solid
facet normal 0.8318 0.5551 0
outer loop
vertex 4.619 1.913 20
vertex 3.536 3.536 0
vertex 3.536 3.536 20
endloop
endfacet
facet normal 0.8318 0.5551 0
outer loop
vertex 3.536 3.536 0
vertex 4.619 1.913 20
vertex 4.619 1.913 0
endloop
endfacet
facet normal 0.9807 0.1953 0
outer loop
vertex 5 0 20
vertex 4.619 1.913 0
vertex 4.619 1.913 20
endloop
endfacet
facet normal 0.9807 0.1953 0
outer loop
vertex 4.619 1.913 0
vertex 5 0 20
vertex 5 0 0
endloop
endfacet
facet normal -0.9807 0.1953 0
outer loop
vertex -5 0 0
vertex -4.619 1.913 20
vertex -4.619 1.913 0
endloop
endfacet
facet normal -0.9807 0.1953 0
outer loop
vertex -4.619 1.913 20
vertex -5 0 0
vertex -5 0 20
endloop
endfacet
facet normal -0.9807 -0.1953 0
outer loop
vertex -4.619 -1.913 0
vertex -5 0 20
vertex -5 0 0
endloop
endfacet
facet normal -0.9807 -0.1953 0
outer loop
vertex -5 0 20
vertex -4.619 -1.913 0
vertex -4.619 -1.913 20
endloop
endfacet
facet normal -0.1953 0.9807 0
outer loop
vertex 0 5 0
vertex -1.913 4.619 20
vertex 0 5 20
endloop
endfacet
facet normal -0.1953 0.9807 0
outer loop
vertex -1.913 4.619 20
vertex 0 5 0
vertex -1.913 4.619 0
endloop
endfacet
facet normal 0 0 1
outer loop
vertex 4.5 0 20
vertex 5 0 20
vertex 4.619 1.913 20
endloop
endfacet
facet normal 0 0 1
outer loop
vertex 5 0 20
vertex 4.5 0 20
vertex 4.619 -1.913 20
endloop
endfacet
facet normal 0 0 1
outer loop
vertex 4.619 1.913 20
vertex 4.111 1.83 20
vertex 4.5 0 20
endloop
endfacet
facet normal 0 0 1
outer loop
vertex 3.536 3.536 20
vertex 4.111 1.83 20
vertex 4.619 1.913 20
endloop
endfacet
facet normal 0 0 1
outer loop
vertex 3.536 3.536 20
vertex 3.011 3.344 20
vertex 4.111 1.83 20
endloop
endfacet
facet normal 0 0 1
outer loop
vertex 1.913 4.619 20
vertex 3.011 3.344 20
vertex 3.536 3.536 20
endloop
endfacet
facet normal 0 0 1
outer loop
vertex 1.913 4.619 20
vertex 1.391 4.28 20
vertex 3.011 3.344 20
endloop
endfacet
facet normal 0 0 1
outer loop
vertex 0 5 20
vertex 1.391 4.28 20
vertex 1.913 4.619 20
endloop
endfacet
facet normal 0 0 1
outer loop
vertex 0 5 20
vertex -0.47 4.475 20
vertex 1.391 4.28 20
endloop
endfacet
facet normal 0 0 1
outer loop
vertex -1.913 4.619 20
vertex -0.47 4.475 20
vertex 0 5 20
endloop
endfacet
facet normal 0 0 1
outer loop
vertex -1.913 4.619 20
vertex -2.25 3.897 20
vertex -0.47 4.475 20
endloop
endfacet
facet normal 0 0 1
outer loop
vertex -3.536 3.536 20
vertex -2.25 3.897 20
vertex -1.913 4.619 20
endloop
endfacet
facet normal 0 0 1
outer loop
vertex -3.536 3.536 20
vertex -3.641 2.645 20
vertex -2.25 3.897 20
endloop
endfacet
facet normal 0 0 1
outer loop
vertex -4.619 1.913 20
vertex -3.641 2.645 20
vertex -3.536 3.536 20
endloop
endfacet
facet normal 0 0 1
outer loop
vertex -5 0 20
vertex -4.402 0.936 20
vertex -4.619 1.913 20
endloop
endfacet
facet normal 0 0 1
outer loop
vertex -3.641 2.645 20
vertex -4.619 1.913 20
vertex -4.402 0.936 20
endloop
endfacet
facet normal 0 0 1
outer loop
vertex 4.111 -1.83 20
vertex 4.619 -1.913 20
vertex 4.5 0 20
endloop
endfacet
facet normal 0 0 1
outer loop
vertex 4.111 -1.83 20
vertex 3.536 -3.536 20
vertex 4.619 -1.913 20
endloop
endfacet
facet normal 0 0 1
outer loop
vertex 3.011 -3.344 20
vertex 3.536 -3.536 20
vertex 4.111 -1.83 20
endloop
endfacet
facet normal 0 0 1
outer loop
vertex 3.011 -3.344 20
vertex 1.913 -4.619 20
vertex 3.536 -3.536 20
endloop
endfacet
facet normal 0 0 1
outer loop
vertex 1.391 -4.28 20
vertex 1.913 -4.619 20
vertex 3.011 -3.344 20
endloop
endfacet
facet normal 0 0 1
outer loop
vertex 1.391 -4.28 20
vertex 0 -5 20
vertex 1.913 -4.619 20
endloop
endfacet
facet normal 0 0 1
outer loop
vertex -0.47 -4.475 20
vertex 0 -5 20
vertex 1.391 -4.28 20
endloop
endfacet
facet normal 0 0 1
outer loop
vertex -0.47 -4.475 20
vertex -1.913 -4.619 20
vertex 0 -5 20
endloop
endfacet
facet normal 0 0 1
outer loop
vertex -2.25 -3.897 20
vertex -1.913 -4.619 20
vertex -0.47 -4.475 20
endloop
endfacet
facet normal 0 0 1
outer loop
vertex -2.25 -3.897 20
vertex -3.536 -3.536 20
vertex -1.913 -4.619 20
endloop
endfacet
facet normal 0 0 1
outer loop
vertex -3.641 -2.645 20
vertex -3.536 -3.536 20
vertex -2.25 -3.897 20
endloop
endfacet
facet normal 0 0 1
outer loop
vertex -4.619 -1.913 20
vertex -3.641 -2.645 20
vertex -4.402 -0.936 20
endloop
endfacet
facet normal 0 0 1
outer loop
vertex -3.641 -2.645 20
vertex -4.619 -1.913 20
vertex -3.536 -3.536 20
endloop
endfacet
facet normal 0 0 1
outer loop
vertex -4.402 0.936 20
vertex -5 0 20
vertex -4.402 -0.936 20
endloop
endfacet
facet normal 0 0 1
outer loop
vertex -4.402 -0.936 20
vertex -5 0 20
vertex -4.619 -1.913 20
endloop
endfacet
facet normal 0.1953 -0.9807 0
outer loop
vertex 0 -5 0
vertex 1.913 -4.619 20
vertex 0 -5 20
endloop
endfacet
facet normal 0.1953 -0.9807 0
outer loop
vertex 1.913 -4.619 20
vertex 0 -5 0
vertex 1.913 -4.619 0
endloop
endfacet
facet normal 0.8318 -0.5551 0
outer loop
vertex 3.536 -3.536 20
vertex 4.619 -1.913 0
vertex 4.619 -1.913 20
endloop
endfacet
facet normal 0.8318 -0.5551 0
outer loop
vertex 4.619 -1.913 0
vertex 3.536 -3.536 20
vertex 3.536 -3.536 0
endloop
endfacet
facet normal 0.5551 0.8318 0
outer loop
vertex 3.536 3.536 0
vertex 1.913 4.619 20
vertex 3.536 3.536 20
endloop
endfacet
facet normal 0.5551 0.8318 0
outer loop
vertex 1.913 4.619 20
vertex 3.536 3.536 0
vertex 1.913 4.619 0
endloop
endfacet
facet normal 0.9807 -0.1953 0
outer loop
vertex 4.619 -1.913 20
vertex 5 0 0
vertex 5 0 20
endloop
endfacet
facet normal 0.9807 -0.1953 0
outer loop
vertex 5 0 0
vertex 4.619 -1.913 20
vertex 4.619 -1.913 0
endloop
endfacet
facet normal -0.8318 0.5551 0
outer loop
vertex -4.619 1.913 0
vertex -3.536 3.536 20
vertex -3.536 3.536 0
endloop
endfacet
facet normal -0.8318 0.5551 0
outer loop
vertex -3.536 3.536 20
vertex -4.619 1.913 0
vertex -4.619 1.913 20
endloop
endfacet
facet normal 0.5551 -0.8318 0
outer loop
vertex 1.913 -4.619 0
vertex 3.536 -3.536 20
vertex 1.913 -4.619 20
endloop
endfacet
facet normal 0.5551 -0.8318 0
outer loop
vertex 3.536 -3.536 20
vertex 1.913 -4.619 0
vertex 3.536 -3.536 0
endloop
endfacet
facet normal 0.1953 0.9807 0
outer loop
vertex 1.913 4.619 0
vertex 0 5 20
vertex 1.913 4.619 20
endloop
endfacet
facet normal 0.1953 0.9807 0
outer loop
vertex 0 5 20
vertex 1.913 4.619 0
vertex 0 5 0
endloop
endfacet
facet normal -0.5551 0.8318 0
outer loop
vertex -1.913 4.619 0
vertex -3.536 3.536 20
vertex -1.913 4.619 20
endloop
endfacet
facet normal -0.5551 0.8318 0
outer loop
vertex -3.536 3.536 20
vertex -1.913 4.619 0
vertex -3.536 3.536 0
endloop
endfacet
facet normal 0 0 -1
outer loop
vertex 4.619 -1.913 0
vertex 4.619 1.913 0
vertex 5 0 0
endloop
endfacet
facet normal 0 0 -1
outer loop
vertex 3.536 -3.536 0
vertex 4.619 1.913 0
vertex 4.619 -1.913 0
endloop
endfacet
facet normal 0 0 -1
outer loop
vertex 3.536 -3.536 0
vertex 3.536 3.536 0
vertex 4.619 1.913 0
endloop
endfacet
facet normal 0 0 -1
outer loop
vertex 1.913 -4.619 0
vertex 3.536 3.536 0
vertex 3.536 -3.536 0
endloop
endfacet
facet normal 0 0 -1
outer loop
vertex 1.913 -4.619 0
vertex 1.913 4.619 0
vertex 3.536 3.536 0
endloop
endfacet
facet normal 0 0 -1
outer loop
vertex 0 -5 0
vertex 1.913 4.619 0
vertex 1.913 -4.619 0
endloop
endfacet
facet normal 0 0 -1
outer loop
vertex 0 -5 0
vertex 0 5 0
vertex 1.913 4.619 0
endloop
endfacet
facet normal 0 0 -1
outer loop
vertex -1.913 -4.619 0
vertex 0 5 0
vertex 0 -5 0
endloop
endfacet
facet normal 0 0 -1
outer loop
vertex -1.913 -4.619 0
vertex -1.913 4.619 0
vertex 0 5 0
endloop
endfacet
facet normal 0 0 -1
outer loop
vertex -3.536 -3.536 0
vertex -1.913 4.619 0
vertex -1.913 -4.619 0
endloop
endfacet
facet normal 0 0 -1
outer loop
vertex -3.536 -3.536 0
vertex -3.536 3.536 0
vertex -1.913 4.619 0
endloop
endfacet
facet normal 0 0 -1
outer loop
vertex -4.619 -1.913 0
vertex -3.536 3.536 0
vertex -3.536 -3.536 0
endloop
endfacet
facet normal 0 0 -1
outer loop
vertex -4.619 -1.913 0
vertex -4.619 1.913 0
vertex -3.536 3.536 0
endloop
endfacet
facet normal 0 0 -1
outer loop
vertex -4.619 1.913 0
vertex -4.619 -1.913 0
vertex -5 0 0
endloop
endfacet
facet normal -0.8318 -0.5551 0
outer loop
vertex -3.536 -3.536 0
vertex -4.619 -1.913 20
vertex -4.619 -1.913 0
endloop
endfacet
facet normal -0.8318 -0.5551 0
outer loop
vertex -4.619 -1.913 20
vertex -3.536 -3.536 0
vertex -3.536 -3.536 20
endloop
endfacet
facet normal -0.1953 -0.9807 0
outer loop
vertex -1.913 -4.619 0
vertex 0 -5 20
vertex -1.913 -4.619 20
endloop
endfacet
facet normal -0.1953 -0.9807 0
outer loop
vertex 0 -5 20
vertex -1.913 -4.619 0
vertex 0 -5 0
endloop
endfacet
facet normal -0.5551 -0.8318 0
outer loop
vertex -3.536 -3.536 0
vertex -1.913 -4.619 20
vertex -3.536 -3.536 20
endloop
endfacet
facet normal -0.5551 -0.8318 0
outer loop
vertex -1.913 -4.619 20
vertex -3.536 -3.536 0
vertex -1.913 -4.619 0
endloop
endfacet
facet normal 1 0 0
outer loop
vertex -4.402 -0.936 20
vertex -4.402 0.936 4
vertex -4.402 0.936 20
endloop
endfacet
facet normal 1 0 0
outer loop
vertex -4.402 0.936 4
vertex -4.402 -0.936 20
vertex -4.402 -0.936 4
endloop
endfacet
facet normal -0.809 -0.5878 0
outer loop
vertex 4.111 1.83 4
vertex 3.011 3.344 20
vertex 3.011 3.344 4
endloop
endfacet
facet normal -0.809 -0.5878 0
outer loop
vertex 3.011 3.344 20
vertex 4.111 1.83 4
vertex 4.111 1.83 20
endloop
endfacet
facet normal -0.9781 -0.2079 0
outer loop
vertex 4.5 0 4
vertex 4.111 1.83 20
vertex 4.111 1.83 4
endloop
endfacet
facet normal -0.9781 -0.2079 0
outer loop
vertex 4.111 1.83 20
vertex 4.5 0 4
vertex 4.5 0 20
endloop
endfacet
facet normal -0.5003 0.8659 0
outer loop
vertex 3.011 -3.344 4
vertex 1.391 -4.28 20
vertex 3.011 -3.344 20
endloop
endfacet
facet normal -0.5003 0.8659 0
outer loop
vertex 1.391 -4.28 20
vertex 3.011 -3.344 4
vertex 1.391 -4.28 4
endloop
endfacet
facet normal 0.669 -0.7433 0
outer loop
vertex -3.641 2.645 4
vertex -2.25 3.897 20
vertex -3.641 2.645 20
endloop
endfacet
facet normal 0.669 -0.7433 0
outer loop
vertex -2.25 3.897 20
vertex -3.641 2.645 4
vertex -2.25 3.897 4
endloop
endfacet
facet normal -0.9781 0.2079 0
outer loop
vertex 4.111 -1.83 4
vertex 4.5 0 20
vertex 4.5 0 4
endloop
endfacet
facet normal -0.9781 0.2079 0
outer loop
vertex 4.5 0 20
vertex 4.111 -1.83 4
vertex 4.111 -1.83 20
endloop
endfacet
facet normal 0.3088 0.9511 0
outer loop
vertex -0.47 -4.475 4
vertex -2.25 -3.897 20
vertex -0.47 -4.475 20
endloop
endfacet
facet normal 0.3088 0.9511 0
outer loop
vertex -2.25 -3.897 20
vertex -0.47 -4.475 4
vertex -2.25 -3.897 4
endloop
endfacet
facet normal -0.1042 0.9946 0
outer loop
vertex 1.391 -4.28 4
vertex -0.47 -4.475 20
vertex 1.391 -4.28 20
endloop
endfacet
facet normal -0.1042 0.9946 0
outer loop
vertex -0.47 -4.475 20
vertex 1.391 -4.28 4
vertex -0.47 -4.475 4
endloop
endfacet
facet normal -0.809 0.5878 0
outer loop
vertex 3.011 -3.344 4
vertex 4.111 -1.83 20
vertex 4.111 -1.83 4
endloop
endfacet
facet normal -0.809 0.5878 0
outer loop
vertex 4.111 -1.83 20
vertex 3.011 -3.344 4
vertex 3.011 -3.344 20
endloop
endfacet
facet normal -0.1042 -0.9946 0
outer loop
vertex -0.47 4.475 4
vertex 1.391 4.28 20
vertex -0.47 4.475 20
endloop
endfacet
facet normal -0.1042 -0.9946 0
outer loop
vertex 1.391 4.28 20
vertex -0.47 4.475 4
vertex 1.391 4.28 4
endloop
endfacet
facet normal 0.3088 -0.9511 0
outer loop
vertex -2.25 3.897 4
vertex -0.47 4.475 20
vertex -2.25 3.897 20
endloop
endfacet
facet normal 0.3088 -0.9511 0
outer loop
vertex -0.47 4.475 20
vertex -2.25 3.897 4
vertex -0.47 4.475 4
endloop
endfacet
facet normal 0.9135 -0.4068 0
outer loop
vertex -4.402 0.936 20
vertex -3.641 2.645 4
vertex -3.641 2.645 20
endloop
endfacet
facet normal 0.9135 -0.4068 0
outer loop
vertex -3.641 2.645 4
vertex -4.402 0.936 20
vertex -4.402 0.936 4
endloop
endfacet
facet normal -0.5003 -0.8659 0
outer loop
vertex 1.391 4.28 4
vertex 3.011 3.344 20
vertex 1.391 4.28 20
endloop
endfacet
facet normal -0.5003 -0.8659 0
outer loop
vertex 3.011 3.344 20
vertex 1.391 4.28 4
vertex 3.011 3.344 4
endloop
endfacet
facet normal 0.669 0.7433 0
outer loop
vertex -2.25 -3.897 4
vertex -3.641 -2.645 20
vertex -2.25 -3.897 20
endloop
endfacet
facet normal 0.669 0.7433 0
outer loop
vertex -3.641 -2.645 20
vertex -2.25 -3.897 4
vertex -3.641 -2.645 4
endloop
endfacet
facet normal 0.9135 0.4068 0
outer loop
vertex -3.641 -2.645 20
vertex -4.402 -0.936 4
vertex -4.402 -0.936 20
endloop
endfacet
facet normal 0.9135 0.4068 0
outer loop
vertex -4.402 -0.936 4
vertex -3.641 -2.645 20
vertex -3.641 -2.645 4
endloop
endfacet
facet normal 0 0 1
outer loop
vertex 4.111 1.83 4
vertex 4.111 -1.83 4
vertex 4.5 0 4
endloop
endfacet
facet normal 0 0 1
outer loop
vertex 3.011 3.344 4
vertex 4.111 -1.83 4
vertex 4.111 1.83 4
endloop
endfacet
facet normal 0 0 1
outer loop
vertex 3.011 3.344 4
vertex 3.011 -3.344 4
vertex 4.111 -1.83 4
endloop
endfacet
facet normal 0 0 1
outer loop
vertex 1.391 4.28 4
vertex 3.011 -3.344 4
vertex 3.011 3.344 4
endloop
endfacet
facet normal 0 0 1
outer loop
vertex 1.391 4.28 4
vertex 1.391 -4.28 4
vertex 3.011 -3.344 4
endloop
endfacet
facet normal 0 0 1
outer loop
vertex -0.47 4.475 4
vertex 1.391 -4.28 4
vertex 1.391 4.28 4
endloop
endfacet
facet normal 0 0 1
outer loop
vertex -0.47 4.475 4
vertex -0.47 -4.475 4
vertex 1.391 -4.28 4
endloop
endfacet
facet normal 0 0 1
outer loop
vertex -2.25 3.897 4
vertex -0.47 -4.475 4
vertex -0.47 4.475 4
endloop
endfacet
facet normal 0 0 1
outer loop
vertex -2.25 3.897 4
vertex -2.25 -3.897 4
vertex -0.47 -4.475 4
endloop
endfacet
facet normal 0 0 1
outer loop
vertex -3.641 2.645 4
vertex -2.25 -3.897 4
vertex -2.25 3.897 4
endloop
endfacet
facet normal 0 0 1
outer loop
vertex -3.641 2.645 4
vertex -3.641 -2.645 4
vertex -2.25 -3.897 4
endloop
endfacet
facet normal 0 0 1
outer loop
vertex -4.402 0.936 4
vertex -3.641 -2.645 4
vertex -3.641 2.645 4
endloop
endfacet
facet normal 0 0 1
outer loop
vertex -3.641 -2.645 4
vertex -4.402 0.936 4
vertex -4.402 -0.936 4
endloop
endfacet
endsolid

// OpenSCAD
// file: tube.scad
module tube(outer_dia, inner_dia, height) {
    difference() {
        cylinder(d=outer_dia, h=height);
        cylinder(d=inner_dia, h=height);
    }
}

tube(20, 17, 50);
// main file
use<tube.scad>

module hole(radius, length) { // end_cap?
	module base(r, l) {
        cylinder(r=r, h=l);
	}

	module shaft(r, l) {
        tube(outer_dia=r*2, inner_dia=r*1.8, height=l);
	}

	base(radius, length * 0.2);
	shaft(radius, length);
}

hole(5, 20);
